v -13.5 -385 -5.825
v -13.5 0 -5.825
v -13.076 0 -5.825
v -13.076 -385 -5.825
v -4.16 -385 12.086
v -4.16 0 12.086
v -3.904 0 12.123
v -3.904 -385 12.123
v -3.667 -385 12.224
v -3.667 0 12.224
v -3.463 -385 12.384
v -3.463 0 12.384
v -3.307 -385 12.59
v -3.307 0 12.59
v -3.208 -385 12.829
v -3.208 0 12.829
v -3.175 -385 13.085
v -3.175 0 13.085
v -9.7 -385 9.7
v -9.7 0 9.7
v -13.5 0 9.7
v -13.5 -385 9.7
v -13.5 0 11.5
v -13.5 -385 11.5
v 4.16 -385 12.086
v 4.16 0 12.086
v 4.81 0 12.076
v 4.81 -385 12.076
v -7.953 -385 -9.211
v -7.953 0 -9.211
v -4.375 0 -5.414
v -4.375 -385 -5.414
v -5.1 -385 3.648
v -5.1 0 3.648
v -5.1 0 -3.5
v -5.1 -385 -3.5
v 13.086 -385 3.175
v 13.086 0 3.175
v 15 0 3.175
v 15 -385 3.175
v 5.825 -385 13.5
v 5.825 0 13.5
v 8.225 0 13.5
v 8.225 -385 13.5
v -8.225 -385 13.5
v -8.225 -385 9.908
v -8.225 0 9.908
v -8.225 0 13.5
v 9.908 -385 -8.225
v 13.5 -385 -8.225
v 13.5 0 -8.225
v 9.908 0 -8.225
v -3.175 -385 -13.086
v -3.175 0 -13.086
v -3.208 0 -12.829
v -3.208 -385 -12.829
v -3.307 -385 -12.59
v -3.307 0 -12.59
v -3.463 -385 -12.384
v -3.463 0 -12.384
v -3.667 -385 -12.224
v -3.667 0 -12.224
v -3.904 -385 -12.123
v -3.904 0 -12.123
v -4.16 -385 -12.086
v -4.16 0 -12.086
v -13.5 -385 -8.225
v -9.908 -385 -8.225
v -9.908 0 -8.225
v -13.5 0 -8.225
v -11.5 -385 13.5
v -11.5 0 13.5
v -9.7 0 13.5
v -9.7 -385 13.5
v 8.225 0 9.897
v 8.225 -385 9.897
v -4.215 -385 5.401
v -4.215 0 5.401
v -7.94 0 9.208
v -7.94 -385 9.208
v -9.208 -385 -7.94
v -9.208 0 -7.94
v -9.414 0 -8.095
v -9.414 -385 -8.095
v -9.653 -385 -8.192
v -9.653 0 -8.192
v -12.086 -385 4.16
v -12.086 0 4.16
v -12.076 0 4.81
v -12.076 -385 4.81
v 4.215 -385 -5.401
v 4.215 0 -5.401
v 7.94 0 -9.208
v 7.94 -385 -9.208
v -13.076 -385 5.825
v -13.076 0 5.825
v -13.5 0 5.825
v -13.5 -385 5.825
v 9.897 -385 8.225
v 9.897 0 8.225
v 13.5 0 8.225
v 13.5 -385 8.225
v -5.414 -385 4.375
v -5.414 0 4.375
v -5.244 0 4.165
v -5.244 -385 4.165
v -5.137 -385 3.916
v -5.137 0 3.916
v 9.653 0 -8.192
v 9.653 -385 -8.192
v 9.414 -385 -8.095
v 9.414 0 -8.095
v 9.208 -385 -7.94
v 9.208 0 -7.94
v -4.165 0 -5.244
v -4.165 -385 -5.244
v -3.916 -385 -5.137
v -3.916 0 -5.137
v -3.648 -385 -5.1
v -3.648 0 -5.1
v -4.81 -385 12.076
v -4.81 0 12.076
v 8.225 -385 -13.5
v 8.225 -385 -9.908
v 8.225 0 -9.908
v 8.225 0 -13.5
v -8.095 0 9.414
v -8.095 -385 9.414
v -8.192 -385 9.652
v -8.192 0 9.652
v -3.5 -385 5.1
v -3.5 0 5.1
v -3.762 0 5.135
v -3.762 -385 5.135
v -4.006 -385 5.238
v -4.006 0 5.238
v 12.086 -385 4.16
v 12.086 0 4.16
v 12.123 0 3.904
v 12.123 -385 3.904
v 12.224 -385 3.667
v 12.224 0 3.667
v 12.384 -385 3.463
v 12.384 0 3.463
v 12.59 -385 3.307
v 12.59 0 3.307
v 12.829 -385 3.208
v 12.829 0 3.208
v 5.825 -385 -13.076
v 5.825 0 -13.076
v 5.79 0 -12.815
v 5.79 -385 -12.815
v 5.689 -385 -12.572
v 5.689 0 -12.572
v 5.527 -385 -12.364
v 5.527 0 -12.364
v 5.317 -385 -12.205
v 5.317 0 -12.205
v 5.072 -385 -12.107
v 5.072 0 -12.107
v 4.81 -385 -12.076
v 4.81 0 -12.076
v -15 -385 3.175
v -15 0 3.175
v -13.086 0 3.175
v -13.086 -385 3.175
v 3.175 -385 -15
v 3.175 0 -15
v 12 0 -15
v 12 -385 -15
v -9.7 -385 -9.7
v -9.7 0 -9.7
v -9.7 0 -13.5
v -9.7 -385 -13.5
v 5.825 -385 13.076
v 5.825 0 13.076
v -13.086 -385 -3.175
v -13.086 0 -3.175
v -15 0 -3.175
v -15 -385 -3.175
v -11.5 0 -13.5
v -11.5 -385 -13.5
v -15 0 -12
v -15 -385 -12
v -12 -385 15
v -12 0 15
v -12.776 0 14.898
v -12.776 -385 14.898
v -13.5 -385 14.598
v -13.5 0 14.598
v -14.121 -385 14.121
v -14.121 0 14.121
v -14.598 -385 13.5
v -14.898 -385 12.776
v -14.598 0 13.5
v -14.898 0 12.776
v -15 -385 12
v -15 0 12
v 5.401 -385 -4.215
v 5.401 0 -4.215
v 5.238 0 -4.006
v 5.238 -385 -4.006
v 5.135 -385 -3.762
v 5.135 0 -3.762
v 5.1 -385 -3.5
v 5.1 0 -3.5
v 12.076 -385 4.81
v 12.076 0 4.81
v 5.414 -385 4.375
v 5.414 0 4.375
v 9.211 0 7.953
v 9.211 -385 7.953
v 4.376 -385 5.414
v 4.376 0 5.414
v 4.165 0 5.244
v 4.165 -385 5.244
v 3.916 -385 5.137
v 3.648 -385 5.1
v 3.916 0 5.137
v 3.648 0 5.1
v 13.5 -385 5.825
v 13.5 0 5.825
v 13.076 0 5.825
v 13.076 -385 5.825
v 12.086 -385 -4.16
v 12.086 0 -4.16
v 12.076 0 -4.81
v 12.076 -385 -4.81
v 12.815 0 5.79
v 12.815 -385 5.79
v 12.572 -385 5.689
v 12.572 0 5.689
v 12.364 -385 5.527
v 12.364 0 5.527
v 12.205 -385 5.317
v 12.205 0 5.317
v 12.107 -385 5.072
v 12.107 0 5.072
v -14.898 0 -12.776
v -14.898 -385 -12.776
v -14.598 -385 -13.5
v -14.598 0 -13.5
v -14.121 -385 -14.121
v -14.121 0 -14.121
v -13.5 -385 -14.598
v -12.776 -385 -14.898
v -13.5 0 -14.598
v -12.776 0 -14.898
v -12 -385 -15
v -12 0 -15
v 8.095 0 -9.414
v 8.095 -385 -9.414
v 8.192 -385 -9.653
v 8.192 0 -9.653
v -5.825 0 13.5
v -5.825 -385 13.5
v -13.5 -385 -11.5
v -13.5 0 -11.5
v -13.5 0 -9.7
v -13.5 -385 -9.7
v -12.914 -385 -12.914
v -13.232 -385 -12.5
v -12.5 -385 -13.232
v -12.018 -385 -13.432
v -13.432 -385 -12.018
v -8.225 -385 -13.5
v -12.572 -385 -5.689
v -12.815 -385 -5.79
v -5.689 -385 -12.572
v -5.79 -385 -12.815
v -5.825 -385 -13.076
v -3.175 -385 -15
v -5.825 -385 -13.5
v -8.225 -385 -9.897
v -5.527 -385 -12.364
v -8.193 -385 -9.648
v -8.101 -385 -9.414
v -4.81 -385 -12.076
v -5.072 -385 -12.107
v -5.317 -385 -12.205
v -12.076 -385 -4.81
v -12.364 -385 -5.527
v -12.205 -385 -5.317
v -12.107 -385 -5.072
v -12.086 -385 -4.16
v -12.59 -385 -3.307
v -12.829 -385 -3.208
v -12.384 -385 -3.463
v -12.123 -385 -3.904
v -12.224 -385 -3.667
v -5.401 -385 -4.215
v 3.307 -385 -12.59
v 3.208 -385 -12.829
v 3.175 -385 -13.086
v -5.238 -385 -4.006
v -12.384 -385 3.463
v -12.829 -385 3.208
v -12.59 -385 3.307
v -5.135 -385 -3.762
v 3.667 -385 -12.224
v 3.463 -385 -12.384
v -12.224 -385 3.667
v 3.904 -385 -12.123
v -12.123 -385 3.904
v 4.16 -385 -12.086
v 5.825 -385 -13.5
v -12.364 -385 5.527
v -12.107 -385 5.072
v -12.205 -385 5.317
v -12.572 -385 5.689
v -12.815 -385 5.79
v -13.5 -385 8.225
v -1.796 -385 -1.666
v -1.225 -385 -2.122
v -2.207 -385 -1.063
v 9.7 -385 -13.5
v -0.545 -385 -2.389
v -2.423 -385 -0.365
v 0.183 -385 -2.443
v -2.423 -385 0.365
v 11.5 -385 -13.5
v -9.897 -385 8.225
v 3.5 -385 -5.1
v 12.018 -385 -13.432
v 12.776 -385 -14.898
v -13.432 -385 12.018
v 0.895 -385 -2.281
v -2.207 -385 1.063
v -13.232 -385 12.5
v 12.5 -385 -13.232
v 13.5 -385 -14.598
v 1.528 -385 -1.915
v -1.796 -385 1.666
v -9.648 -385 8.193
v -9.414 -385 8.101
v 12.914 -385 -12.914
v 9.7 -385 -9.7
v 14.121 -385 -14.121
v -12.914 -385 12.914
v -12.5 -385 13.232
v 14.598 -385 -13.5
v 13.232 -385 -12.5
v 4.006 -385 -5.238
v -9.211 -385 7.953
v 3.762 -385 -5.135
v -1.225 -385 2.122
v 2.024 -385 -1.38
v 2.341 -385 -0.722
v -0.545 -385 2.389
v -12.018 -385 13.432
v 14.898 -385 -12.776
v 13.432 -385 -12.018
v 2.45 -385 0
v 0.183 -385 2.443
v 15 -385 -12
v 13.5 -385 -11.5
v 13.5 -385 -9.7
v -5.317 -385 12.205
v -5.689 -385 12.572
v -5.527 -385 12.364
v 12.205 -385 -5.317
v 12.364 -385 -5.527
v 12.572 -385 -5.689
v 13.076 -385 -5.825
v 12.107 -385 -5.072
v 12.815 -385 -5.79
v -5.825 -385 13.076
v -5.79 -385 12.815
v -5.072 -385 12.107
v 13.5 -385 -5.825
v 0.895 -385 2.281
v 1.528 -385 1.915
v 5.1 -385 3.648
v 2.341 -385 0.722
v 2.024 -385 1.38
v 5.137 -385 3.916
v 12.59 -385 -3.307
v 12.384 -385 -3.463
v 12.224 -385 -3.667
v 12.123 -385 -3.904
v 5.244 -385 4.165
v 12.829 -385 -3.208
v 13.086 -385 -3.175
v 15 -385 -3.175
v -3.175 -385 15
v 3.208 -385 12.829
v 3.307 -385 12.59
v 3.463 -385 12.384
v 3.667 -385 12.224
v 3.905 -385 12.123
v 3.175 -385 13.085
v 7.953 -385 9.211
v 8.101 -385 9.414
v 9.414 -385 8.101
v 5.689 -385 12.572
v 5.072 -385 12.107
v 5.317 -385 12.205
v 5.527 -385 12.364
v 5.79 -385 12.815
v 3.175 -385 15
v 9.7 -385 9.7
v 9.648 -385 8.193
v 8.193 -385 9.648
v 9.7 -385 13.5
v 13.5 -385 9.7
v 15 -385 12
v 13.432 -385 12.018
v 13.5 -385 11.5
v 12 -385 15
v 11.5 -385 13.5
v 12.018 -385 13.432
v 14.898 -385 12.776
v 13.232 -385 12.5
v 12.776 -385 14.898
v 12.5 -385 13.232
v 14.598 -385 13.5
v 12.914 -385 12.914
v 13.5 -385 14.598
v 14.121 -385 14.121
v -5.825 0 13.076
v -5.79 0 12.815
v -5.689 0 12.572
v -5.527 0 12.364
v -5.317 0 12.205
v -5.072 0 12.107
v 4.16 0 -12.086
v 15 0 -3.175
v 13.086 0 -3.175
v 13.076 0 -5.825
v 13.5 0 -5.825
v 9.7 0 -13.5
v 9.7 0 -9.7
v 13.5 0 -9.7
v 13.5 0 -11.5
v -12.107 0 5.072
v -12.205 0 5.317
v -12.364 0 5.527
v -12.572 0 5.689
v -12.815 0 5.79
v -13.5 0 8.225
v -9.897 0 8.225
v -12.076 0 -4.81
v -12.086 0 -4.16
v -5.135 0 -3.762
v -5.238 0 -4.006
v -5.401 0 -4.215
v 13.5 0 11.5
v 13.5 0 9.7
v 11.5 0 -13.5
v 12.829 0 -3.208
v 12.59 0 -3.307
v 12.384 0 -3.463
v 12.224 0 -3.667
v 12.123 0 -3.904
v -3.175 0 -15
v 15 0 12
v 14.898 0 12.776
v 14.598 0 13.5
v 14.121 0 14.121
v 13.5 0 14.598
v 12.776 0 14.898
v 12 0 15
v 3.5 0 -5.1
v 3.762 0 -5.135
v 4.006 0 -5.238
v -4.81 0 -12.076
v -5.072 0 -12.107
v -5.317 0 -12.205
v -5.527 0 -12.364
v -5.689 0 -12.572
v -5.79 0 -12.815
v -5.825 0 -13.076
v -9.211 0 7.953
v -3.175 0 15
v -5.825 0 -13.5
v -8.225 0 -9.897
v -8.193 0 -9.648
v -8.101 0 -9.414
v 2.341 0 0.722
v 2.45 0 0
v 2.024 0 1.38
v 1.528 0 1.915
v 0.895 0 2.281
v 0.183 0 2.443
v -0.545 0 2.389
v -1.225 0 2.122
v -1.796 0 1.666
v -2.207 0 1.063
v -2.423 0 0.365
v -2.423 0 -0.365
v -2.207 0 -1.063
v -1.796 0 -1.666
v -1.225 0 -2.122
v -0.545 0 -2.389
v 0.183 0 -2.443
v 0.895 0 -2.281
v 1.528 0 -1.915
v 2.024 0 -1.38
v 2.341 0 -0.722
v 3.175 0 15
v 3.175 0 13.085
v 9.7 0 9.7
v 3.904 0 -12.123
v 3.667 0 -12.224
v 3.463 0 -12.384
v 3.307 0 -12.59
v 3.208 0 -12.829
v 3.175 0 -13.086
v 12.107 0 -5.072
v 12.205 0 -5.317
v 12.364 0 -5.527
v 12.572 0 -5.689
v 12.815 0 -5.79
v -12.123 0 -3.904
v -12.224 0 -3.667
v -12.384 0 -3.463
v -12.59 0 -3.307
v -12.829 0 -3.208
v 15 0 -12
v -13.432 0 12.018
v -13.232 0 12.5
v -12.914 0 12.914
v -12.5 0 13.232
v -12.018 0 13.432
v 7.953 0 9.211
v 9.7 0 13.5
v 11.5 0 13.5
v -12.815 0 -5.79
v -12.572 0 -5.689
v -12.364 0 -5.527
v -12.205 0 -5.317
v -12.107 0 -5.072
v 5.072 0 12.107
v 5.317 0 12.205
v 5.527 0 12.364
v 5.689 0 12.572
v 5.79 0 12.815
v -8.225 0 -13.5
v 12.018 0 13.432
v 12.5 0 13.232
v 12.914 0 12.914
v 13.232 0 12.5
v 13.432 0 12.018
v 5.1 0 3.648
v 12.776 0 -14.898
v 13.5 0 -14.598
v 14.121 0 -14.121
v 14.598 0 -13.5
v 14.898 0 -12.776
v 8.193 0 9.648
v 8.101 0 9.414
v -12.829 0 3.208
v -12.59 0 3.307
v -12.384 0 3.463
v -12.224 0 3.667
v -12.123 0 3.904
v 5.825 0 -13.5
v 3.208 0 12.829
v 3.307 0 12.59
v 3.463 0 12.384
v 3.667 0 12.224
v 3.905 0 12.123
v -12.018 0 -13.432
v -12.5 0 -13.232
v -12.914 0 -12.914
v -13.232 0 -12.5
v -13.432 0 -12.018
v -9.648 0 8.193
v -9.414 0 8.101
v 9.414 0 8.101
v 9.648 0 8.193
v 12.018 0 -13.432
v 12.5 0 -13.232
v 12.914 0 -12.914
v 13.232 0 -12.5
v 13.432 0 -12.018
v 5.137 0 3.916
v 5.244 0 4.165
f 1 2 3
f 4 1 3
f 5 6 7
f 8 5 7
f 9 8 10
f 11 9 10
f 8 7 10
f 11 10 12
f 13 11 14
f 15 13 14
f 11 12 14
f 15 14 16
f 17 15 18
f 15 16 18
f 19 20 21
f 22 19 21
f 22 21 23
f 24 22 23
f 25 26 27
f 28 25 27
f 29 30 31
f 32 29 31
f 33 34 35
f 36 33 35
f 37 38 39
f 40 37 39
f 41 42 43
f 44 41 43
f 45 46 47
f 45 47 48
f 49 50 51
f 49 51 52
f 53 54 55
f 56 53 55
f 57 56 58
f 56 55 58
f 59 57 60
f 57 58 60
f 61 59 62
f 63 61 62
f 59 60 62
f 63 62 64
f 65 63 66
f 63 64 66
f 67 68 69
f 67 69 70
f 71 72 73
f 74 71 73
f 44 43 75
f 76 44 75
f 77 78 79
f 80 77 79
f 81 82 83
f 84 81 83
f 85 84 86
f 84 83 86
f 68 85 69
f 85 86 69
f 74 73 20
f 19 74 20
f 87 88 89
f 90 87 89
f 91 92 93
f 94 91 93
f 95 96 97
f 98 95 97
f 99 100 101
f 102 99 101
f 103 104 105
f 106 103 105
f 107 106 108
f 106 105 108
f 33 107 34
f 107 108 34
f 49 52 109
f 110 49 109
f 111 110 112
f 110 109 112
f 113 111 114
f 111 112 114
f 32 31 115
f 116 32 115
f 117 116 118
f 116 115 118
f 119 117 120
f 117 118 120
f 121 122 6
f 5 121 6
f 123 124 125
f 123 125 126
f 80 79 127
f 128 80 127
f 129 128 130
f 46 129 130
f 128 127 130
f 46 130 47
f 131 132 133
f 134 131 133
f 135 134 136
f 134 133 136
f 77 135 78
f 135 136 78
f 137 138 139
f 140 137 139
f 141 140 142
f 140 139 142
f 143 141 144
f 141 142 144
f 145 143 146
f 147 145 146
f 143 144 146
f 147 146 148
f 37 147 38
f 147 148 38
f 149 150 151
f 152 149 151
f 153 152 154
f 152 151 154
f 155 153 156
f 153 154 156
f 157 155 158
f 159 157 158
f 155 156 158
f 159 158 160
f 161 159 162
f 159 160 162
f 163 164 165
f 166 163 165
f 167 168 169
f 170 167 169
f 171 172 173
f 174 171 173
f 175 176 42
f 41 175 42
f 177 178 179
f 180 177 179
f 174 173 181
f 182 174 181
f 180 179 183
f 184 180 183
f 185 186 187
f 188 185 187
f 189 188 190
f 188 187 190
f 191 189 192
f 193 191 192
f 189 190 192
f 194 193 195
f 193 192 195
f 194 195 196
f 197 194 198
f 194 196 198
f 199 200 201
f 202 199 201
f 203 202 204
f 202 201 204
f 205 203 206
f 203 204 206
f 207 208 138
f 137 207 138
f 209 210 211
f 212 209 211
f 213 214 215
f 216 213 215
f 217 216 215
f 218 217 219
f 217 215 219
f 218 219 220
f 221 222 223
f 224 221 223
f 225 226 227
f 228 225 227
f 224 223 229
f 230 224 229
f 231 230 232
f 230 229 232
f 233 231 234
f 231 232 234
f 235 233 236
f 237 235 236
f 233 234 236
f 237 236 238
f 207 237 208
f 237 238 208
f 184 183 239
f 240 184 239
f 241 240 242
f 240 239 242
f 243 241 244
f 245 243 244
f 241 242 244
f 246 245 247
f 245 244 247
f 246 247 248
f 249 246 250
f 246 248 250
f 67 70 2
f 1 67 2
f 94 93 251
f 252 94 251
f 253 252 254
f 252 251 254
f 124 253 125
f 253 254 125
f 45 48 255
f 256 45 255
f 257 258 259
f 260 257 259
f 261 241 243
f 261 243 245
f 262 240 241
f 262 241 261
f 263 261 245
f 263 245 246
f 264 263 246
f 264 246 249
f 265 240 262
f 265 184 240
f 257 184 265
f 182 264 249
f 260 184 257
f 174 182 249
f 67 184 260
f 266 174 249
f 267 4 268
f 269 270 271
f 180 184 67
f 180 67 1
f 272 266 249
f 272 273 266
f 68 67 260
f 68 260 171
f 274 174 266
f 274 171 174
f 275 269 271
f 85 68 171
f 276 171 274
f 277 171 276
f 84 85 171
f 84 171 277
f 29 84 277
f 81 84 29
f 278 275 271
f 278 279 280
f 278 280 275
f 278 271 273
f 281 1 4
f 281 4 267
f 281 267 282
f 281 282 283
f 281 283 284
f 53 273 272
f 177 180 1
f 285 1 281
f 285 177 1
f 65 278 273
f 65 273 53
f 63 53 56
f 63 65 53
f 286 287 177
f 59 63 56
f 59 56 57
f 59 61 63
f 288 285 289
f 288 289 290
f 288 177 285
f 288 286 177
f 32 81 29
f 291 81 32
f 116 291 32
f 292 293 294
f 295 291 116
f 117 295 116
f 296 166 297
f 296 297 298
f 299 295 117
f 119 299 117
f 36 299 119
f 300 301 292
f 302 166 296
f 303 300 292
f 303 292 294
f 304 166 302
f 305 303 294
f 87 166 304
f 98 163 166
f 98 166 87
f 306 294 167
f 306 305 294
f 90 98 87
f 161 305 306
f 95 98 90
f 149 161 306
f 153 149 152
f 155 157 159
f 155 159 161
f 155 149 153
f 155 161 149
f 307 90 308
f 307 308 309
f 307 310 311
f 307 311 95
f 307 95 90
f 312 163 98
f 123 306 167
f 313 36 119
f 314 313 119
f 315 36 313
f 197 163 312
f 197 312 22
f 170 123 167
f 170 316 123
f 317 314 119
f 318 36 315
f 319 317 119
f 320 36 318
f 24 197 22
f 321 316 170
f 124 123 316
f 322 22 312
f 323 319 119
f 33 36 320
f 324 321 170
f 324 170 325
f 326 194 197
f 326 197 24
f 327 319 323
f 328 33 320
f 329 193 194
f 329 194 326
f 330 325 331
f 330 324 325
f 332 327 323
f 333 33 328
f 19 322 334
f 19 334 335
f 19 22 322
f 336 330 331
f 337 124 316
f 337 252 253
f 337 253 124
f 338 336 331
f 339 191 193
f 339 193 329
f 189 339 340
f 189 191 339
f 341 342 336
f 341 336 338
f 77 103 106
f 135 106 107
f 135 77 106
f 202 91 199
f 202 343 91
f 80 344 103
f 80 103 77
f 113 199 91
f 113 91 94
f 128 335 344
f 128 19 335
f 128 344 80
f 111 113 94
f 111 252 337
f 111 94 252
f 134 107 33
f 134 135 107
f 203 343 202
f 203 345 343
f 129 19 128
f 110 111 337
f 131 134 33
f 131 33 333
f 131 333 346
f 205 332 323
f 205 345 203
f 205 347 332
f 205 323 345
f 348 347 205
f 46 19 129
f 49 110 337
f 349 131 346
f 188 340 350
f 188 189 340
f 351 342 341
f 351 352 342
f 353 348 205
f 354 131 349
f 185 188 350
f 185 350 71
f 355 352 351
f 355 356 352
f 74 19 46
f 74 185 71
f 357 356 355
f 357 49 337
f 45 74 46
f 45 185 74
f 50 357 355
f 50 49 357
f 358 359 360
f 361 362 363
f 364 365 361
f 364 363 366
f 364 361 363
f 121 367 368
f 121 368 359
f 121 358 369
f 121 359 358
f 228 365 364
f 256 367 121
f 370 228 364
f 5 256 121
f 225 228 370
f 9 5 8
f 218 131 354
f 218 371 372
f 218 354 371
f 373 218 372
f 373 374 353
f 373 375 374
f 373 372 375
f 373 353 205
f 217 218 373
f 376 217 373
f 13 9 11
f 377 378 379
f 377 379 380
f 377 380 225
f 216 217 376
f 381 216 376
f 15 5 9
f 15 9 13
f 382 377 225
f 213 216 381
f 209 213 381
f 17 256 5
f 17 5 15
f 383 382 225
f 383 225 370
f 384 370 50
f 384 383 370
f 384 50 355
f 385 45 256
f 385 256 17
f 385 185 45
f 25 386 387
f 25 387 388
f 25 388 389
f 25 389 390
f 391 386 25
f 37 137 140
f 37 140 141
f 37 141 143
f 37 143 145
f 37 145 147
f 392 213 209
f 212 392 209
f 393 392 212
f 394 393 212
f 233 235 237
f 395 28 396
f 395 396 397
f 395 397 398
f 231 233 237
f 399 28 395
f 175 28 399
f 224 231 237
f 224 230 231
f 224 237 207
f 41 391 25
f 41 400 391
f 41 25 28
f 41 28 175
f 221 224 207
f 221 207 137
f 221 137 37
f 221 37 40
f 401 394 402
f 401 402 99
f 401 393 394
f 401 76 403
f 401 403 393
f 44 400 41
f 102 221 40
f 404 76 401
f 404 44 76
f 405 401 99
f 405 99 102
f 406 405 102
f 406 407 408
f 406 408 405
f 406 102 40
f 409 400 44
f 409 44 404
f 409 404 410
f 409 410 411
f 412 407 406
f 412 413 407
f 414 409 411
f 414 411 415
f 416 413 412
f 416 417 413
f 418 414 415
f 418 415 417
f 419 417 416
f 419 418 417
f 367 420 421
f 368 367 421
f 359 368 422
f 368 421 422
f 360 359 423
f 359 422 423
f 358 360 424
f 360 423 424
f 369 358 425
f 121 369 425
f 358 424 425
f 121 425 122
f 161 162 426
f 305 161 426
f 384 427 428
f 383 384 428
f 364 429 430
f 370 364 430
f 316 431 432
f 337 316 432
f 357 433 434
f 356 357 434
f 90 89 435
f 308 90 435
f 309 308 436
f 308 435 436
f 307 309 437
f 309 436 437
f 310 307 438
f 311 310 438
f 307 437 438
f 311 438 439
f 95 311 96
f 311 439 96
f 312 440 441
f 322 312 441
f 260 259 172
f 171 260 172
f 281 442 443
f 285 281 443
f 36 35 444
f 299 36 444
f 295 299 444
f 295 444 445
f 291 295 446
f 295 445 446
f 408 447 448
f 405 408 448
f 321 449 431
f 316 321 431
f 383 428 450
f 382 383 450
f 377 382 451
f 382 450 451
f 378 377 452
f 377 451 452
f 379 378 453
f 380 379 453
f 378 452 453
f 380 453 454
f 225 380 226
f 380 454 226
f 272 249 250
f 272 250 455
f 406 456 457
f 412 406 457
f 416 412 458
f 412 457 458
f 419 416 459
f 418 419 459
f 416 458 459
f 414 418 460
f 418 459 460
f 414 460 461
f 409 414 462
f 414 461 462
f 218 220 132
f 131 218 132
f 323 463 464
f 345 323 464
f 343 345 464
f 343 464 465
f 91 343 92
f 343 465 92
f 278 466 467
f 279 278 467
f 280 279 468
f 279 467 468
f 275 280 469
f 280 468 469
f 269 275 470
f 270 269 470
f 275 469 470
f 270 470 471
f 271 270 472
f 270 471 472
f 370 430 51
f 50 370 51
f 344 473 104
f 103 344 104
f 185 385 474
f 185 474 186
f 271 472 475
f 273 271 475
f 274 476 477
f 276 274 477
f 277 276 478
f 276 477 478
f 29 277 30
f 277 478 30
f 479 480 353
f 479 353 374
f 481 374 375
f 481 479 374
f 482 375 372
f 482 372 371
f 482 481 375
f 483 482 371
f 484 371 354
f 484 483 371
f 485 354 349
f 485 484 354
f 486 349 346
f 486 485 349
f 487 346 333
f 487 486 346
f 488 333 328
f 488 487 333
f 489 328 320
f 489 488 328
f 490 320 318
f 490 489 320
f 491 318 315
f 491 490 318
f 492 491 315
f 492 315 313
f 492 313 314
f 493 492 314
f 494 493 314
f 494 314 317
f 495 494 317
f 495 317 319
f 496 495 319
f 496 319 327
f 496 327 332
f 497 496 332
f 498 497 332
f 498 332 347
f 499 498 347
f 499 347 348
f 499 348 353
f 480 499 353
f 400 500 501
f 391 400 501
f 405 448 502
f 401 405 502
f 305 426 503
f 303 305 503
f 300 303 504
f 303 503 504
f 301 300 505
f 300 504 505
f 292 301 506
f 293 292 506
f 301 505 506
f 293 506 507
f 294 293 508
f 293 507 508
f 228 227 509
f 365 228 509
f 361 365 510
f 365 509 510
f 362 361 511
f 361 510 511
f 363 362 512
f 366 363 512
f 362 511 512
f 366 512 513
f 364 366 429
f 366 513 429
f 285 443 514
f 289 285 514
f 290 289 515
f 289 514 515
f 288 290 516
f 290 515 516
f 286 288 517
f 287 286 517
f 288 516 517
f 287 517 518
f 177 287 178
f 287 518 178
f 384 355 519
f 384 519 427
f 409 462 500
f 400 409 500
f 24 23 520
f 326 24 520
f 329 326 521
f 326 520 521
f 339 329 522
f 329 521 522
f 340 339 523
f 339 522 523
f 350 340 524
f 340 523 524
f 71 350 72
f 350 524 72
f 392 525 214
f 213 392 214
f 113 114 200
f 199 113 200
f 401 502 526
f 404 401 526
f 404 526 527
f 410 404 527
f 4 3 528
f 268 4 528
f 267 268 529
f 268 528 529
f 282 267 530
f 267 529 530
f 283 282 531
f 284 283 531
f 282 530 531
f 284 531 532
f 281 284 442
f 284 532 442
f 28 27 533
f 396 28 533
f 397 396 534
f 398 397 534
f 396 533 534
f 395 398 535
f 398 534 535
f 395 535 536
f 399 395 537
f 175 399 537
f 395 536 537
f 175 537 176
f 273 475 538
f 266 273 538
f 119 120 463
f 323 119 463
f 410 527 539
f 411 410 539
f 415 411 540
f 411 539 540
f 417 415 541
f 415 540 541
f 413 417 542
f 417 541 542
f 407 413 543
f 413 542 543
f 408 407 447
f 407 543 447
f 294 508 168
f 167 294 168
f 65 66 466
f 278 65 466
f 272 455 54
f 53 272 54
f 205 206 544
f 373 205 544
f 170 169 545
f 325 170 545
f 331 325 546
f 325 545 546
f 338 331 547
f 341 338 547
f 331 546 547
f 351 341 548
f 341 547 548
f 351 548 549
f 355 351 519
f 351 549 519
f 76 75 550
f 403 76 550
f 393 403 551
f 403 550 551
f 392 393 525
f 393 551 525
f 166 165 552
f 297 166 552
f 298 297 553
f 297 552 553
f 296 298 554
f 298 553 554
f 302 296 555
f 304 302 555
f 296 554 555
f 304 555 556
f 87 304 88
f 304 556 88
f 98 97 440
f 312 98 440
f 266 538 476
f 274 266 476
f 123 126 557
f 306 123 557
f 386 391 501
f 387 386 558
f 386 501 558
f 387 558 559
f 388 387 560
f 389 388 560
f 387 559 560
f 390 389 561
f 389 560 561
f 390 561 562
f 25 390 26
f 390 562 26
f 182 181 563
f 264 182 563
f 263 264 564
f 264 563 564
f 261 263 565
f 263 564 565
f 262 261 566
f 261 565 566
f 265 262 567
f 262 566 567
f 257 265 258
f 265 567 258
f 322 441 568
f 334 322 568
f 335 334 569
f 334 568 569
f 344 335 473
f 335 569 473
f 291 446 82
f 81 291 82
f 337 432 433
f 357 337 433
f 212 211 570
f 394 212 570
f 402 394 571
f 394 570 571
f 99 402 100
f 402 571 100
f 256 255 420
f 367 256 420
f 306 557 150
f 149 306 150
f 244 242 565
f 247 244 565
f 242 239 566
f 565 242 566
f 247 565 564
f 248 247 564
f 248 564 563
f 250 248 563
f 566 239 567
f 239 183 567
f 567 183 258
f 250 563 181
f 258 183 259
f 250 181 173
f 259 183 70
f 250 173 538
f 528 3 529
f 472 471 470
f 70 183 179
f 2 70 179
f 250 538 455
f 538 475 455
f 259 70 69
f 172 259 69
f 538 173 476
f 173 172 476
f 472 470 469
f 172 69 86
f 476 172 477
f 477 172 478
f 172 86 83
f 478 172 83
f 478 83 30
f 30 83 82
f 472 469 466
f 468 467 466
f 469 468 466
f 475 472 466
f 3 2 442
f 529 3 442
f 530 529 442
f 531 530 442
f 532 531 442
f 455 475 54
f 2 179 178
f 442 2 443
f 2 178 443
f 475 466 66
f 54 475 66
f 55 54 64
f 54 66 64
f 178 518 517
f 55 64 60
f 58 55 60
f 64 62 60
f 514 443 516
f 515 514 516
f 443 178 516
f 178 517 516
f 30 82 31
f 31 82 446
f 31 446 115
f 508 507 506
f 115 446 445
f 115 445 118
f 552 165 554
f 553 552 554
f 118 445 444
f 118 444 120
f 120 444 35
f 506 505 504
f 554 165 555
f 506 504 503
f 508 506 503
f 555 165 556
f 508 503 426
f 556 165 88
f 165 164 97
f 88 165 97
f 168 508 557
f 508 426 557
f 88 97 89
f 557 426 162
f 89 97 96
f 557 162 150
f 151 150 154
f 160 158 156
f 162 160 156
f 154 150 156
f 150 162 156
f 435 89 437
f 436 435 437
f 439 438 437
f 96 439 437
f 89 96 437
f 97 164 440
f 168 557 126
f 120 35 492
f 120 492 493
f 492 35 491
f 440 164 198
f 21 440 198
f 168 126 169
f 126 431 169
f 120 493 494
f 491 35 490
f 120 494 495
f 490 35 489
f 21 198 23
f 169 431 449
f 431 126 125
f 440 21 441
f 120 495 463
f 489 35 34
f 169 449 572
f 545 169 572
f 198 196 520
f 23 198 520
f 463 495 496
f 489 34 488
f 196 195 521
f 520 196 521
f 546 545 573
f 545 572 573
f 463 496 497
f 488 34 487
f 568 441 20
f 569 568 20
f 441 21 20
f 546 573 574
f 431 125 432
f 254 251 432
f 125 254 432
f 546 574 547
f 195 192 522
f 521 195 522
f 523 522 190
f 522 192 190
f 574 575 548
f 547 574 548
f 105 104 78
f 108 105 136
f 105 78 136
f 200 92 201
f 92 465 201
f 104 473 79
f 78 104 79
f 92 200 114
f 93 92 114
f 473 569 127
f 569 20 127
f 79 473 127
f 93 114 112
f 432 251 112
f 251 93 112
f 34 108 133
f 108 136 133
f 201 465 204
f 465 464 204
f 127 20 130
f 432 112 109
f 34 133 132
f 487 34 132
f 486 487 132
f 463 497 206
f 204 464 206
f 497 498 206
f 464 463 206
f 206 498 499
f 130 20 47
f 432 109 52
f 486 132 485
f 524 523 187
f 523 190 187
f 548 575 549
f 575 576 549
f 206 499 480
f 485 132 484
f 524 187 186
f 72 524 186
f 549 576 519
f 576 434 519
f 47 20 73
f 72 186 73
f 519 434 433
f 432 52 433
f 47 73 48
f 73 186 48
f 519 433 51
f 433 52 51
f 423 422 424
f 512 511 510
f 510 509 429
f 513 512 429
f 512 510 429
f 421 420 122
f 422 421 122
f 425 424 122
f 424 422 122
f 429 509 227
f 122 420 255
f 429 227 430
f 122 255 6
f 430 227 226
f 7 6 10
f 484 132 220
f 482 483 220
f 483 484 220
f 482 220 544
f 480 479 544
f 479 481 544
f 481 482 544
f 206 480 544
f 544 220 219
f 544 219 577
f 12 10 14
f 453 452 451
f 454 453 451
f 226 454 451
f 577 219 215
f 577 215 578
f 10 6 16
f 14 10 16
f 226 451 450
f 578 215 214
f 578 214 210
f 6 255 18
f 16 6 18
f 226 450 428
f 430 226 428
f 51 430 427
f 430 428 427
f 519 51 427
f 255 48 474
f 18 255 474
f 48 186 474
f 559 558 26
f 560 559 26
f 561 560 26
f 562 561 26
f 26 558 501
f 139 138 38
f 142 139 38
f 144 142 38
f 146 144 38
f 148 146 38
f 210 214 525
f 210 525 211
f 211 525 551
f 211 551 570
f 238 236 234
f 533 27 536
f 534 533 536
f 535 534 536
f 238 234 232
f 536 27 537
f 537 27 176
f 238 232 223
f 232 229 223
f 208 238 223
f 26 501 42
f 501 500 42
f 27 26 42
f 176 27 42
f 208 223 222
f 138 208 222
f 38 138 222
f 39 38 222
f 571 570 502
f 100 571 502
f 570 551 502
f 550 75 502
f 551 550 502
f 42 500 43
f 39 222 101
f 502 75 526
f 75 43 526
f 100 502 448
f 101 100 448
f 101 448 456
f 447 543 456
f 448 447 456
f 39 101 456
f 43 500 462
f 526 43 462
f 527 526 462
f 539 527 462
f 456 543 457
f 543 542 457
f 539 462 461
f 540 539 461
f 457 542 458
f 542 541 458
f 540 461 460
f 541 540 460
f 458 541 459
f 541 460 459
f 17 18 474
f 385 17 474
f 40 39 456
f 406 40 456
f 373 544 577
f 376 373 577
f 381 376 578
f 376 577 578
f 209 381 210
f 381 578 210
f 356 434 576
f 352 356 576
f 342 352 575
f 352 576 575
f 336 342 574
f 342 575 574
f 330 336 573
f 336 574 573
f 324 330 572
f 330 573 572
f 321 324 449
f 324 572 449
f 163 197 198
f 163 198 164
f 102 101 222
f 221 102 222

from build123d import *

# Parameters (mm, degrees)
F0_R     = 2.45
F1_DEPTH = 460
F2_DEPTH = 75


# Not quite as in the source:
# - ends of sketch curves that miss each other by under 0.0002 mm in the source are joined


with BuildPart() as f1:
    # F0 (on Front) → F1 (new body)
    with BuildSketch(Plane.XZ):
        with BuildLine():
            Line((-3.1749674082, 15), (-12, 15))
            ThreePointArc((-12, 15), (-14.1213203436, 14.1213203436), (-15, 12))
            Line((-15, 12), (-15, 3.175))
            Line((-15, 3.175), (-13.0855346263, 3.175))
            ThreePointArc((-13.0855346263, 3.175), (-12.3835980145, 3.4627605788), (-12.0856407741, 4.1604300138))
            Line((-12.0856407741, 4.1604300138), (-12.0761692778, 4.8104300138))
            ThreePointArc((-12.0761692778, 4.8104300138), (-12.3638237087, 5.5269366118), (-13.0760631299, 5.825))
            Line((-13.0760631299, 5.825), (-13.5, 5.825))
            Line((-13.5, 5.825), (-13.5, 8.225))
            Line((-13.5, 8.225), (-9.8968845016, 8.225))
            ThreePointArc((-9.8968845016, 8.225), (-9.5279915195, 8.1544718757), (-9.2111331975, 7.9528359354))
            Line((-9.2111331975, 7.9528359354), (-5.4142486959, 4.3754933338))
            ThreePointArc((-5.4142486959, 4.3754933338), (-5.1819174045, 4.0440465354), (-5.1, 3.6476573984))
            Line((-5.1, 3.6476573984), (-5.1, -3.4999243287))
            ThreePointArc((-5.1, -3.4999243287), (-5.1782354607, -3.8876744211), (-5.4007002683, -4.2147528992))
            Line((-5.4007002683, -4.2147528992), (-9.2084959767, -7.9398285705))
            ThreePointArc((-9.2084959767, -7.9398285705), (-9.5301904718, -8.1509666761), (-9.9077957084, -8.225))
            Line((-9.9077957084, -8.225), (-13.5, -8.225))
            Line((-13.5, -8.225), (-13.5, -5.825))
            Line((-13.5, -5.825), (-13.0760631299, -5.825))
            ThreePointArc((-13.0760631299, -5.825), (-12.3638237087, -5.5269366118), (-12.0761692778, -4.8104300138))
            Line((-12.0761692778, -4.8104300138), (-12.0856407741, -4.1604300138))
            ThreePointArc((-12.0856407741, -4.1604300138), (-12.3835980145, -3.4627605788), (-13.0855346263, -3.175))
            Line((-13.0855346263, -3.175), (-15, -3.175))
            Line((-15, -3.175), (-15, -12))
            ThreePointArc((-15, -12), (-14.1213203436, -14.1213203436), (-12, -15))
            Line((-12, -15), (-3.175, -15))
            Line((-3.175, -15), (-3.175, -13.0855346263))
            ThreePointArc((-3.175, -13.0855346263), (-3.4627605788, -12.3835980145), (-4.1604300138, -12.0856407741))
            Line((-4.1604300138, -12.0856407741), (-4.8104300138, -12.0761692778))
            ThreePointArc((-4.8104300138, -12.0761692778), (-5.5269366118, -12.3638237087), (-5.825, -13.0760631299))
            Line((-5.825, -13.0760631299), (-5.825, -13.5))
            Line((-5.825, -13.5), (-8.225, -13.5))
            Line((-8.225, -13.5), (-8.225, -9.8968845016))
            ThreePointArc((-8.225, -9.8968845016), (-8.1544718757, -9.5279915195), (-7.9528359354, -9.2111331975))
            Line((-7.9528359354, -9.2111331975), (-4.3754933338, -5.4142486959))
            ThreePointArc((-4.3754933338, -5.4142486959), (-4.0440465354, -5.1819174045), (-3.6476573984, -5.1))
            Line((-3.6476573984, -5.1), (3.4999243287, -5.1))
            ThreePointArc((3.4999243287, -5.1), (3.8876744211, -5.1782354607), (4.2147528992, -5.4007002683))
            Line((4.2147528992, -5.4007002683), (7.9398285705, -9.2084959767))
            ThreePointArc((7.9398285705, -9.2084959767), (8.1509666761, -9.5301904718), (8.225, -9.9077957084))
            Line((8.225, -9.9077957084), (8.225, -13.5))
            Line((8.225, -13.5), (5.825, -13.5))
            Line((5.825, -13.5), (5.825, -13.0760631299))
            ThreePointArc((5.825, -13.0760631299), (5.5269366118, -12.3638237087), (4.8104300138, -12.0761692778))
            Line((4.8104300138, -12.0761692778), (4.1604300138, -12.0856407741))
            ThreePointArc((4.1604300138, -12.0856407741), (3.4627605788, -12.3835980145), (3.175, -13.0855346263))
            Line((3.175, -13.0855346263), (3.175, -15))
            Line((3.175, -15), (12, -15))
            ThreePointArc((12, -15), (14.1213203436, -14.1213203436), (15, -12))
            Line((15, -12), (15, -3.175))
            Line((15, -3.175), (13.0855346263, -3.175))
            ThreePointArc((13.0855346263, -3.175), (12.3835980145, -3.4627605788), (12.0856407741, -4.1604300138))
            Line((12.0856407741, -4.1604300138), (12.0761692778, -4.8104300138))
            ThreePointArc((12.0761692778, -4.8104300138), (12.3638237087, -5.5269366118), (13.0760631299, -5.825))
            Line((13.0760631299, -5.825), (13.5, -5.825))
            Line((13.5, -5.825), (13.5, -8.225))
            Line((13.5, -8.225), (9.9077957084, -8.225))
            ThreePointArc((9.9077957084, -8.225), (9.5301904718, -8.1509666761), (9.2084959767, -7.9398285705))
            Line((9.2084959767, -7.9398285705), (5.4007002683, -4.2147528992))
            ThreePointArc((5.4007002683, -4.2147528992), (5.1782354607, -3.8876744211), (5.1, -3.4999243287))
            Line((5.1, -3.4999243287), (5.1, 3.6476573984))
            ThreePointArc((5.1, 3.6476573984), (5.1819174045, 4.0440465354), (5.4142486959, 4.3754933338))
            Line((5.4142486959, 4.3754933338), (9.2111331975, 7.9528359354))
            ThreePointArc((9.2111331975, 7.9528359354), (9.5279915195, 8.1544718757), (9.8968845016, 8.225))
            Line((9.8968845016, 8.225), (13.5, 8.225))
            Line((13.5, 8.225), (13.5, 5.825))
            Line((13.5, 5.825), (13.0760631299, 5.825))
            ThreePointArc((13.0760631299, 5.825), (12.3638237087, 5.5269366118), (12.0761692778, 4.8104300138))
            Line((12.0761692778, 4.8104300138), (12.0856407741, 4.1604300138))
            ThreePointArc((12.0856407741, 4.1604300138), (12.3835980145, 3.4627605788), (13.0855346263, 3.175))
            Line((13.0855346263, 3.175), (15, 3.175))
            Line((15, 3.175), (15, 12))
            ThreePointArc((15, 12), (14.1213203436, 14.1213203436), (12, 15))
            Line((12, 15), (3.1750325918, 15))
            Line((3.1750325918, 15), (3.1750325918, 13.0854824722))
            ThreePointArc((3.1750325918, 13.0854824722), (3.4627931706, 12.3835458604), (4.1604626057, 12.0855886201))
            Line((4.1604626057, 12.0855886201), (4.8104626057, 12.0761171237))
            ThreePointArc((4.8104626057, 12.0761171237), (5.5269692036, 12.3637715546), (5.8250325918, 13.0760109758))
            Line((5.8250325918, 13.0760109758), (5.8250325918, 13.4999478459))
            Line((5.8250325918, 13.4999478459), (8.2250325918, 13.4999478459))
            Line((8.2250325918, 13.4999478459), (8.2250325918, 9.8968323476))
            ThreePointArc((8.2250325918, 9.8968323476), (8.1545044675, 9.5279393654), (7.9528685272, 9.2110810434))
            Line((7.9528685272, 9.2110810434), (4.3755259256, 5.4141965418))
            ThreePointArc((4.3755259256, 5.4141965418), (4.0440791272, 5.1818652505), (3.6476899902, 5.0999478459))
            Line((3.6476899902, 5.0999478459), (-3.4998917369, 5.0999478459))
            ThreePointArc((-3.4998917369, 5.0999478459), (-3.8876418293, 5.1781833067), (-4.2147203074, 5.4006481142))
            Line((-4.2147203074, 5.4006481142), (-7.9397959787, 9.2084438226))
            ThreePointArc((-7.9397959787, 9.2084438226), (-8.1509340843, 9.5301383177), (-8.2249674082, 9.9077435543))
            Line((-8.2249674082, 9.9077435543), (-8.2249674082, 13.4999478459))
            Line((-8.2249674082, 13.4999478459), (-5.8249674082, 13.4999478459))
            Line((-5.8249674082, 13.4999478459), (-5.8249674082, 13.0760109758))
            ThreePointArc((-5.8249674082, 13.0760109758), (-5.5269040199, 12.3637715546), (-4.810397422, 12.0761171237))
            Line((-4.810397422, 12.0761171237), (-4.160397422, 12.0855886201))
            ThreePointArc((-4.160397422, 12.0855886201), (-3.462727987, 12.3835458604), (-3.1749674082, 13.0854824722))
            Line((-3.1749674082, 13.0854824722), (-3.1749674082, 15))
        make_face()
        with BuildLine():
            Line((-13.5, -11.5), (-13.5, -9.7))
            Line((-13.5, -9.7), (-9.7, -9.7))
            Line((-9.7, -9.7), (-9.7, -13.5))
            Line((-9.7, -13.5), (-11.5, -13.5))
            ThreePointArc((-11.5, -13.5), (-12.9142135624, -12.9142135624), (-13.5, -11.5))
        make_face(mode=Mode.SUBTRACT)
        with BuildLine():
            Line((9.7, -9.7), (13.5, -9.7))
            Line((13.5, -9.7), (13.5, -11.5))
            ThreePointArc((13.5, -11.5), (12.9142135624, -12.9142135624), (11.5, -13.5))
            Line((11.5, -13.5), (9.7, -13.5))
            Line((9.7, -13.5), (9.7, -9.7))
        make_face(mode=Mode.SUBTRACT)
        with BuildLine():
            ThreePointArc((-13.5, 11.5), (-12.9142135624, 12.9142135624), (-11.5, 13.5))
            Line((-11.5, 13.5), (-9.7, 13.5))
            Line((-9.7, 13.5), (-9.7, 9.7))
            Line((-9.7, 9.7), (-13.5, 9.7))
            Line((-13.5, 9.7), (-13.5, 11.5))
        make_face(mode=Mode.SUBTRACT)
        Circle(F0_R, mode=Mode.SUBTRACT)
        with BuildLine():
            Line((9.7, 13.5), (11.5, 13.5))
            ThreePointArc((11.5, 13.5), (12.9142135624, 12.9142135624), (13.5, 11.5))
            Line((13.5, 11.5), (13.5, 9.7))
            Line((13.5, 9.7), (9.7, 9.7))
            Line((9.7, 9.7), (9.7, 13.5))
        make_face(mode=Mode.SUBTRACT)
    extrude(amount=F1_DEPTH)

    # F2 (cut): a face of the model
    f2_faces = [f1.faces().sort_by_distance(p)[0] for p in [
        (5.2291627207, -460, 12.6659491494),
    ]]
    extrude(f2_faces, amount=-F2_DEPTH, mode=Mode.SUBTRACT)


solid = f1.part
